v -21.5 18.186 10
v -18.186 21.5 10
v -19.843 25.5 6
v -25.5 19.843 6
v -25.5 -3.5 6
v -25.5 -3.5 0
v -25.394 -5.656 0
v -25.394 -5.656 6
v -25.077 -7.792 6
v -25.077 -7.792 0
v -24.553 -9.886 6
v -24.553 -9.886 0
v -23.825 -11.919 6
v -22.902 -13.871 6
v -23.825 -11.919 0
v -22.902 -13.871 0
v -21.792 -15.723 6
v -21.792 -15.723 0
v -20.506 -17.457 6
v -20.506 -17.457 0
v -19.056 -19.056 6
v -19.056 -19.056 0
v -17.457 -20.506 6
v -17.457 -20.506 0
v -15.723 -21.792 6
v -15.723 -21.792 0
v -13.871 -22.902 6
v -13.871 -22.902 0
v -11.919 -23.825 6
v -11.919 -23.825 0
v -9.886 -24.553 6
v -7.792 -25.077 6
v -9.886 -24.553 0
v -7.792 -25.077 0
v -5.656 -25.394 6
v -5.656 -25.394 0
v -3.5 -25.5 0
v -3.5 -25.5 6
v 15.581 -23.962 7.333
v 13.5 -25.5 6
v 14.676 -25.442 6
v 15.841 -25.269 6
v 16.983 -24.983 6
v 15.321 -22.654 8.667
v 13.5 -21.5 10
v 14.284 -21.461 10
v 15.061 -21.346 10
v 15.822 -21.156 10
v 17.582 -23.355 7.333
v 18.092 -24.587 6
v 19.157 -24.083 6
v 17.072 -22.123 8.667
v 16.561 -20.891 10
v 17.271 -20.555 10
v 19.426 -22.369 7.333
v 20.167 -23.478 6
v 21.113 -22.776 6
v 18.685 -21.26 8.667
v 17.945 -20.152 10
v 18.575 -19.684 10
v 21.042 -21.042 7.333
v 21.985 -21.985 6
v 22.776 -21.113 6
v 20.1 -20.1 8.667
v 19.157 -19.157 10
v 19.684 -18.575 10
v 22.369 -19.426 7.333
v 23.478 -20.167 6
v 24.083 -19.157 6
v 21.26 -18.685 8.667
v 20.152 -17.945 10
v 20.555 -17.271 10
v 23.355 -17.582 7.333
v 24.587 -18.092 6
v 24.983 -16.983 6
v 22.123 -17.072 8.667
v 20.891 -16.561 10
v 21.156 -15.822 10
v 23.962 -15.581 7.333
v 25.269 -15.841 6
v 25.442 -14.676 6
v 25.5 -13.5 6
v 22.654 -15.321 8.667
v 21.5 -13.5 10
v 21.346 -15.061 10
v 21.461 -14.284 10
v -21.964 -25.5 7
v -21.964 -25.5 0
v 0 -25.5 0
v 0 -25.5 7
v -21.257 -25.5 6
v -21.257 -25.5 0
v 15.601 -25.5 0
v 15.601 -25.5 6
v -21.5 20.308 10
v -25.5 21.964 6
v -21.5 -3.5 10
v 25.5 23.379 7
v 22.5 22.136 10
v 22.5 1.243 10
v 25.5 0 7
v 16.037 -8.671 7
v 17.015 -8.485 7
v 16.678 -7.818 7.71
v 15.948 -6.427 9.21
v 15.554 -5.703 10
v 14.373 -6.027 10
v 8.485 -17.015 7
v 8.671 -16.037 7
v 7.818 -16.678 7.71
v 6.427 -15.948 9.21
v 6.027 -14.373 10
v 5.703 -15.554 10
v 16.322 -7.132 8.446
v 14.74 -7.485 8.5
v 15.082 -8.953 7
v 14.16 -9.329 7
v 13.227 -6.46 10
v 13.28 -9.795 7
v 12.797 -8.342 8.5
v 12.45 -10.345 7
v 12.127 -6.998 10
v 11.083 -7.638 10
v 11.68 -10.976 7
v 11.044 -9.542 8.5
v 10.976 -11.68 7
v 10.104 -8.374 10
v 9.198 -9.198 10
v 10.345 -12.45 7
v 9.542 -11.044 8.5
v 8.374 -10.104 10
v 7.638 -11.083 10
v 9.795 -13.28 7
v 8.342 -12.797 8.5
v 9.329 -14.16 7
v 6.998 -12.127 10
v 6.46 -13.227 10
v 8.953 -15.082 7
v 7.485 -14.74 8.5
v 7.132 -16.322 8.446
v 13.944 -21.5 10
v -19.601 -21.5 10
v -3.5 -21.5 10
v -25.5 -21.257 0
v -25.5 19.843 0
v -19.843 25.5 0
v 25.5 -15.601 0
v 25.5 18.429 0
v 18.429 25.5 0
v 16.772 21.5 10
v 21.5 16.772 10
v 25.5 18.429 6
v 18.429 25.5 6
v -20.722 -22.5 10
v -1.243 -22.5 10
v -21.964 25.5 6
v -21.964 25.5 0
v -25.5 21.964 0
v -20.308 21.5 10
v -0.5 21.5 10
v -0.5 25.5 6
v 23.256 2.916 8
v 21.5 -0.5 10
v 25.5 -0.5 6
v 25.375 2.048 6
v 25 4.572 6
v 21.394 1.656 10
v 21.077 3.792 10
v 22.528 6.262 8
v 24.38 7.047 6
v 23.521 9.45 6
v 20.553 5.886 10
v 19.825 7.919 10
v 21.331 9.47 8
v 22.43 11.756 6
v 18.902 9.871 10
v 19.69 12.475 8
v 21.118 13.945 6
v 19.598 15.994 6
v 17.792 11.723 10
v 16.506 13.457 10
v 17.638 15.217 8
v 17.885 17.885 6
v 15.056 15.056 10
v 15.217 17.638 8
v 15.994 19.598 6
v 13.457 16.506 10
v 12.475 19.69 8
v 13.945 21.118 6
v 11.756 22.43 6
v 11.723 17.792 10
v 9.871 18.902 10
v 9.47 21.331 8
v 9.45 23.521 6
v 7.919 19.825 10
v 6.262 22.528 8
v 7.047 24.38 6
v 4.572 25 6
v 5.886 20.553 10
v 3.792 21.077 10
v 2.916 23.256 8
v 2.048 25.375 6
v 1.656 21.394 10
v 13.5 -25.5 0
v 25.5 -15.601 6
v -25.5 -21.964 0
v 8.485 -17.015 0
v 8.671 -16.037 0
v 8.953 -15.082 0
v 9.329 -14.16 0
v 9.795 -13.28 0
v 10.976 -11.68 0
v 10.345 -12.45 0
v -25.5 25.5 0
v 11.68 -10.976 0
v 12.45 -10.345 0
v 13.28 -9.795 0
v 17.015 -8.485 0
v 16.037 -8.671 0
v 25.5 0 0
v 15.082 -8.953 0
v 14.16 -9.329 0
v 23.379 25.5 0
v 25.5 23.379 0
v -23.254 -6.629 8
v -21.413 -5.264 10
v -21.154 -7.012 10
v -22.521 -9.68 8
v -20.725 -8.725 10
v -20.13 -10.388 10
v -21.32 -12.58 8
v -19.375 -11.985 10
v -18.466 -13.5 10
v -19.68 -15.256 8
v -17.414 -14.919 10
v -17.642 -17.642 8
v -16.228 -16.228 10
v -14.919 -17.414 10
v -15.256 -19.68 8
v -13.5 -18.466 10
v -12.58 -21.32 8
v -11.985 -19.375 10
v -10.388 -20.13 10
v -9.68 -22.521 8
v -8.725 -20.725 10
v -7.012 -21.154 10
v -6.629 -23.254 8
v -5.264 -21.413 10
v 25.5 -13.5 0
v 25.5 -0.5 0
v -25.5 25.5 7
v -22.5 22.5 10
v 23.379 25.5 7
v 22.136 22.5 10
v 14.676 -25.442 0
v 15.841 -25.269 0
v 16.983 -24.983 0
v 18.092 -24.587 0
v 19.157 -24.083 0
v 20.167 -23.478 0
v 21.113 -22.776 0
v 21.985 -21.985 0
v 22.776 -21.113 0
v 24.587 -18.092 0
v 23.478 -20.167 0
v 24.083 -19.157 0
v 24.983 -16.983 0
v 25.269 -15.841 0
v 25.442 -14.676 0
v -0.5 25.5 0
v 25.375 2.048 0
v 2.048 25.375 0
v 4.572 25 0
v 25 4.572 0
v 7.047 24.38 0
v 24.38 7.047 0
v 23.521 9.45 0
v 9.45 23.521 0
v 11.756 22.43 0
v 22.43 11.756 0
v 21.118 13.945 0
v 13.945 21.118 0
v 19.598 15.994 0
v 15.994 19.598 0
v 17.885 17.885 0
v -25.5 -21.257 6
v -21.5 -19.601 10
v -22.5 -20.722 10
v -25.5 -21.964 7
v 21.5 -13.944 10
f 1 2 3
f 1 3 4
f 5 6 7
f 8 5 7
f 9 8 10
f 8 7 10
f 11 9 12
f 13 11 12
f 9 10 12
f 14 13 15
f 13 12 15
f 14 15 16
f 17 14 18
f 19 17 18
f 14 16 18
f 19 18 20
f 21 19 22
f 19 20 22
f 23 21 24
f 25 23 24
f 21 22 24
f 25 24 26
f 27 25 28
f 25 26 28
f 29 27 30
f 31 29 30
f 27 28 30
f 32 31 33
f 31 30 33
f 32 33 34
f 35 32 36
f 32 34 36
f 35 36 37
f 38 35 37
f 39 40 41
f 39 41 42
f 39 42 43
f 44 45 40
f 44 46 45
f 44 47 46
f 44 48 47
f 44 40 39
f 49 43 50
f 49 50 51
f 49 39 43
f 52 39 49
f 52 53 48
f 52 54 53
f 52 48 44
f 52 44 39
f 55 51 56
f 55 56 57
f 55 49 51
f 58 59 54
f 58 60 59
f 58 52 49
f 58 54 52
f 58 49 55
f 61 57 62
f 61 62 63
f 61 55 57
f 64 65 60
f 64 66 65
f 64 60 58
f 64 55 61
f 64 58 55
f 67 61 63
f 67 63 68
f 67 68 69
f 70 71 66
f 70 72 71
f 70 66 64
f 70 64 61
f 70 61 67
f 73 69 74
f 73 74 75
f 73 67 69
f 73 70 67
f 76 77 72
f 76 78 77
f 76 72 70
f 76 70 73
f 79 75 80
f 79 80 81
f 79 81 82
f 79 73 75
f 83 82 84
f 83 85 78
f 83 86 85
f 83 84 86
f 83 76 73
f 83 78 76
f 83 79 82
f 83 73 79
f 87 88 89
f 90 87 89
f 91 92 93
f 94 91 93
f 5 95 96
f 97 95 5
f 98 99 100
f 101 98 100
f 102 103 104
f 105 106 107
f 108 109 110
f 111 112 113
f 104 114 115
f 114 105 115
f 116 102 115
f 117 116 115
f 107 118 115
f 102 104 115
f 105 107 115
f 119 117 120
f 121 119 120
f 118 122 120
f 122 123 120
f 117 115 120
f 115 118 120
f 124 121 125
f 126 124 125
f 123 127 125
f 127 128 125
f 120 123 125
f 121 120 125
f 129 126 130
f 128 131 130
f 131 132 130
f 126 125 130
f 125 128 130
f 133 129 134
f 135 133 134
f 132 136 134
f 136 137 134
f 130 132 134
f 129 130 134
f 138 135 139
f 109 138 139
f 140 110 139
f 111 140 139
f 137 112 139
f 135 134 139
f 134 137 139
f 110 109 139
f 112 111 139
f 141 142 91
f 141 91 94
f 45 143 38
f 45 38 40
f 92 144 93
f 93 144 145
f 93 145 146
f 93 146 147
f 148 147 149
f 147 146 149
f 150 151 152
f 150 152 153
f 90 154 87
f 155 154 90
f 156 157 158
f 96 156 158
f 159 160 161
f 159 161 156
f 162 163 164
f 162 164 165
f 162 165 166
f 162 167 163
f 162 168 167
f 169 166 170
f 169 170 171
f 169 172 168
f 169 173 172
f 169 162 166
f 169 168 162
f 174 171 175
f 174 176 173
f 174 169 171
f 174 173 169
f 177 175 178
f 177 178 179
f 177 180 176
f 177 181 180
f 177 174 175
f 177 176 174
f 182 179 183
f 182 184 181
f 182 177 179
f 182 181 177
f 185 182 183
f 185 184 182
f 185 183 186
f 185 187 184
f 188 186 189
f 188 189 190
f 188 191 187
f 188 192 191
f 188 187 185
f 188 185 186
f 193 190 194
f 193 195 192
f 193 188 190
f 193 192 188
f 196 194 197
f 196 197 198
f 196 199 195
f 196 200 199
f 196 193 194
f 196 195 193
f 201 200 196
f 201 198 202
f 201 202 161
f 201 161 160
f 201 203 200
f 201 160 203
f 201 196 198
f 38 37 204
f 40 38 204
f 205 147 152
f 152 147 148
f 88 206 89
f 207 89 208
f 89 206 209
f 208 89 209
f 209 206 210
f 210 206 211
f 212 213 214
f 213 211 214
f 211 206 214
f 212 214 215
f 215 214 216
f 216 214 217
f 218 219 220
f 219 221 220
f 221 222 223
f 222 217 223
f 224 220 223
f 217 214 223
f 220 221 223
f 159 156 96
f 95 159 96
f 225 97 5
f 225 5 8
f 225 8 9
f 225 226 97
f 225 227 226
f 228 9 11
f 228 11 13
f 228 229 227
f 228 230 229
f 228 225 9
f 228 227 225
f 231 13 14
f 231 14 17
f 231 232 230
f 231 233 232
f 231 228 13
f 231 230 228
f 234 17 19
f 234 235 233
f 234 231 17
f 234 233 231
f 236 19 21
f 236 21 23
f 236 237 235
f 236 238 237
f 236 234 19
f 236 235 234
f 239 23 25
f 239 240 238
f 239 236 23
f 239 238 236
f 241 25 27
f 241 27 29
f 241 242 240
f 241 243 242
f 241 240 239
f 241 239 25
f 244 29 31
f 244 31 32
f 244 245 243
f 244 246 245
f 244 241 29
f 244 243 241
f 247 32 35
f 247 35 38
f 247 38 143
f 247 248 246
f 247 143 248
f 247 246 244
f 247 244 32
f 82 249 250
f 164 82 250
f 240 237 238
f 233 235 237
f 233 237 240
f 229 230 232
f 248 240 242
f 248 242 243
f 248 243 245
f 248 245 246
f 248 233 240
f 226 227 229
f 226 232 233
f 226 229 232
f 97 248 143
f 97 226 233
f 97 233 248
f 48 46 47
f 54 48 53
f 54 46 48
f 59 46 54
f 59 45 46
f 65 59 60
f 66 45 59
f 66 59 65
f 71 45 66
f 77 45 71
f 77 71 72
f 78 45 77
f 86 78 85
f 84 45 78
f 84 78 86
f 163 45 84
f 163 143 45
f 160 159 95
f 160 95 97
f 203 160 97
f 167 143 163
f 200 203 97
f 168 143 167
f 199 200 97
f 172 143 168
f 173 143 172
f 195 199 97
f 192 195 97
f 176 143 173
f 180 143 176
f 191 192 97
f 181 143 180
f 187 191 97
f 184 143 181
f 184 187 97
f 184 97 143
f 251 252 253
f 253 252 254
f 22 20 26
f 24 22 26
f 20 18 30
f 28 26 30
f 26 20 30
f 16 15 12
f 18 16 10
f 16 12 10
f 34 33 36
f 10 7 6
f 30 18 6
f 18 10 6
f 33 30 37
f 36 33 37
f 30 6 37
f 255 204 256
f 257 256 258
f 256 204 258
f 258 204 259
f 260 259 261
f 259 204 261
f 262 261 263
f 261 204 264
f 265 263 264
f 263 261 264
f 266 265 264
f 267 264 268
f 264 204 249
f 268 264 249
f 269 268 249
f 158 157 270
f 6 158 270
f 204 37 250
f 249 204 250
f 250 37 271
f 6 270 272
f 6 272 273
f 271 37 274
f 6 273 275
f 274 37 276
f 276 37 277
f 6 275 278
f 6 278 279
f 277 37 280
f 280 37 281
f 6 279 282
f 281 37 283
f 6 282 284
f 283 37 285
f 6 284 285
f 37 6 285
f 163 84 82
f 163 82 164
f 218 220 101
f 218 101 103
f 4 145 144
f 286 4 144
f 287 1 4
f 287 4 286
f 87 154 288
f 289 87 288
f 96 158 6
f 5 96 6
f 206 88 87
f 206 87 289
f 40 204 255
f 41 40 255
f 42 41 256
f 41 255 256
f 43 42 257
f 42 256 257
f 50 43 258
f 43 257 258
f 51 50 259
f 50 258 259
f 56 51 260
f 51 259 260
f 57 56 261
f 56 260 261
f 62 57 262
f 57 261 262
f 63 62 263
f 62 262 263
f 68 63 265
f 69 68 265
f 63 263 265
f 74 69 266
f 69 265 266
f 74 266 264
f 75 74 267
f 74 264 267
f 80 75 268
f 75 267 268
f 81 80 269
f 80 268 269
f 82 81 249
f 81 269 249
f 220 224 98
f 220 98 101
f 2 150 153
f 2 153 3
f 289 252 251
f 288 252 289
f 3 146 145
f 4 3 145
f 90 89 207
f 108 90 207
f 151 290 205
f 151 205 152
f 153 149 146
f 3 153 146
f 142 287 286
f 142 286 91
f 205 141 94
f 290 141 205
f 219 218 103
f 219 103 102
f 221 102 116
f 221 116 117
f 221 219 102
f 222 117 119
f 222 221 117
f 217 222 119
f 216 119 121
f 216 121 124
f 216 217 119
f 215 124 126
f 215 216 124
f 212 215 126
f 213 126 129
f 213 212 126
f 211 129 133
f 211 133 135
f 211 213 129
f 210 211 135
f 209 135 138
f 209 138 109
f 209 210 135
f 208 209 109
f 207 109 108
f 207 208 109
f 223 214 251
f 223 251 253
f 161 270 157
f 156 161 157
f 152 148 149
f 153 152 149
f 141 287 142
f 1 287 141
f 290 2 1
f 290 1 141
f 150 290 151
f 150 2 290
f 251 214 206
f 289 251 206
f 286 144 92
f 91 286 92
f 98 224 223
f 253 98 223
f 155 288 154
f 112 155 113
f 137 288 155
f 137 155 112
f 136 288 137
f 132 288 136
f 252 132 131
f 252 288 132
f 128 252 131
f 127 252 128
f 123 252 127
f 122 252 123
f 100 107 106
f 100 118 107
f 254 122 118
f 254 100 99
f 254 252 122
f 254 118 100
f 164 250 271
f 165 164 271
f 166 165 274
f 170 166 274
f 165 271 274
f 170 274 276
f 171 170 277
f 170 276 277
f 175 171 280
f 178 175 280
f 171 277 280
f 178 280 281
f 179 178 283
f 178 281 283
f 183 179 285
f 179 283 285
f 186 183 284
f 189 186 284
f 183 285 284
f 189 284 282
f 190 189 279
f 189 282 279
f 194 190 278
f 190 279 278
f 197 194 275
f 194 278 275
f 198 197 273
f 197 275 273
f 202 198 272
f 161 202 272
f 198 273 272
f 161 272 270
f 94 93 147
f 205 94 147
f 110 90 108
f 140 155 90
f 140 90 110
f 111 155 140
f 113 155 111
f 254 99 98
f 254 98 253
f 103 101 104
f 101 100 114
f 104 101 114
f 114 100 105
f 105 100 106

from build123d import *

# Parameters (mm, degrees)
PAD_DEPTH       = 10
CHAMFER_SIZE    = 4
PAD001_DEPTH    = 10
CHAMFER001_SIZE = 4
PAD002_DEPTH    = 10
CHAMFER002_SIZE = 3


with BuildPart() as f_2body:
    # Sketch → Pad (new body)
    with BuildSketch(Plane.XY):
        Polygon((-25.5, 19.843146), (-25.5, -21.257359), (-21.257359, -25.5), (15.600505, -25.5), (25.5, -15.600505), (25.5, 18.428932), (18.428932, 25.5), (-19.843146, 25.5), align=None)
    extrude(amount=PAD_DEPTH)

    # Chamfer
    chamfer_edges = [f_2body.edges().sort_by_distance(p)[0] for p in [
        (-2.828427, -25.5, 10),
        (-23.37868, -23.37868, 10),
        (-25.5, -0.707107, 10),
        (-22.671573, 22.671573, 10),
        (-0.707107, 25.5, 10),
        (21.964466, 21.964466, 10),
        (25.5, 1.414214, 10),
        (20.550253, -20.550253, 10),
    ]]
    chamfer(chamfer_edges, length=CHAMFER_SIZE)


with BuildPart() as f_4body:
    # Sketch001 → Pad001 (new body)
    with BuildSketch(Plane.XY):
        with BuildLine():
            Line((-3.5, -25.5), (13.5, -25.5))
            ThreePointArc((13.5, -25.5), (21.985281, -21.985281), (25.5, -13.5))
            Line((25.5, -13.5), (25.5, -0.5))
            ThreePointArc((25.5, -0.5), (17.884776, 17.884776), (-0.5, 25.5))
            Line((-0.5, 25.5), (-21.964466, 25.5))
            Line((-21.964466, 25.5), (-25.5, 21.964466))
            Line((-25.5, 21.964466), (-25.5, -3.5))
            ThreePointArc((-25.5, -3.5), (-19.056349, -19.056349), (-3.5, -25.5))
        make_face()
    extrude(amount=PAD001_DEPTH)

    # Chamfer001
    chamfer001_edges = [f_4body.edges().sort_by_distance(p)[0] for p in [
        (-23.732233, 23.732233, 10),
        (-11.232233, 25.5, 10),
        (17.884776, 17.884776, 10),
        (25.5, -7, 10),
        (21.985281, -21.985281, 10),
        (5, -25.5, 10),
        (-19.056349, -19.056349, 10),
        (-25.5, 9.232233, 10),
    ]]
    chamfer(chamfer001_edges, length=CHAMFER001_SIZE)


with BuildPart() as f_3body:
    # Sketch002 → Pad002 (new body)
    with BuildSketch(Plane.XY):
        with BuildLine():
            Line((-25.5, 25.5), (-25.5, -21.964466))
            Line((-21.964466, -25.5), (-25.5, -21.964466))
            Line((-21.964466, -25.5), (0, -25.5))
            Line((0, -25.5), (8.485281, -17.014719))
            ThreePointArc((17.014719, -8.485281), (11.31916, -11.31916), (8.485281, -17.014719))
            Line((25.5, 0), (17.014719, -8.485281))
            Line((25.5, 23.37868), (25.5, 0))
            Line((25.5, 23.37868), (23.37868, 25.5))
            Line((-25.5, 25.5), (23.37868, 25.5))
        make_face()
    extrude(amount=PAD002_DEPTH)

    # Chamfer002
    chamfer002_edges = [f_3body.edges().sort_by_distance(p)[0] for p in [
        (-25.5, 1.767767, 10),
        (-1.06066, 25.5, 10),
        (24.43934, 24.43934, 10),
        (25.5, 11.68934, 10),
        (21.257359, -4.242641, 10),
        (11.31916, -11.31916, 10),
        (4.242641, -21.257359, 10),
        (-10.982233, -25.5, 10),
        (-23.732233, -23.732233, 10),
    ]]
    chamfer(chamfer002_edges, length=CHAMFER002_SIZE)


solid = Compound([f_2body.part, f_4body.part, f_3body.part])
